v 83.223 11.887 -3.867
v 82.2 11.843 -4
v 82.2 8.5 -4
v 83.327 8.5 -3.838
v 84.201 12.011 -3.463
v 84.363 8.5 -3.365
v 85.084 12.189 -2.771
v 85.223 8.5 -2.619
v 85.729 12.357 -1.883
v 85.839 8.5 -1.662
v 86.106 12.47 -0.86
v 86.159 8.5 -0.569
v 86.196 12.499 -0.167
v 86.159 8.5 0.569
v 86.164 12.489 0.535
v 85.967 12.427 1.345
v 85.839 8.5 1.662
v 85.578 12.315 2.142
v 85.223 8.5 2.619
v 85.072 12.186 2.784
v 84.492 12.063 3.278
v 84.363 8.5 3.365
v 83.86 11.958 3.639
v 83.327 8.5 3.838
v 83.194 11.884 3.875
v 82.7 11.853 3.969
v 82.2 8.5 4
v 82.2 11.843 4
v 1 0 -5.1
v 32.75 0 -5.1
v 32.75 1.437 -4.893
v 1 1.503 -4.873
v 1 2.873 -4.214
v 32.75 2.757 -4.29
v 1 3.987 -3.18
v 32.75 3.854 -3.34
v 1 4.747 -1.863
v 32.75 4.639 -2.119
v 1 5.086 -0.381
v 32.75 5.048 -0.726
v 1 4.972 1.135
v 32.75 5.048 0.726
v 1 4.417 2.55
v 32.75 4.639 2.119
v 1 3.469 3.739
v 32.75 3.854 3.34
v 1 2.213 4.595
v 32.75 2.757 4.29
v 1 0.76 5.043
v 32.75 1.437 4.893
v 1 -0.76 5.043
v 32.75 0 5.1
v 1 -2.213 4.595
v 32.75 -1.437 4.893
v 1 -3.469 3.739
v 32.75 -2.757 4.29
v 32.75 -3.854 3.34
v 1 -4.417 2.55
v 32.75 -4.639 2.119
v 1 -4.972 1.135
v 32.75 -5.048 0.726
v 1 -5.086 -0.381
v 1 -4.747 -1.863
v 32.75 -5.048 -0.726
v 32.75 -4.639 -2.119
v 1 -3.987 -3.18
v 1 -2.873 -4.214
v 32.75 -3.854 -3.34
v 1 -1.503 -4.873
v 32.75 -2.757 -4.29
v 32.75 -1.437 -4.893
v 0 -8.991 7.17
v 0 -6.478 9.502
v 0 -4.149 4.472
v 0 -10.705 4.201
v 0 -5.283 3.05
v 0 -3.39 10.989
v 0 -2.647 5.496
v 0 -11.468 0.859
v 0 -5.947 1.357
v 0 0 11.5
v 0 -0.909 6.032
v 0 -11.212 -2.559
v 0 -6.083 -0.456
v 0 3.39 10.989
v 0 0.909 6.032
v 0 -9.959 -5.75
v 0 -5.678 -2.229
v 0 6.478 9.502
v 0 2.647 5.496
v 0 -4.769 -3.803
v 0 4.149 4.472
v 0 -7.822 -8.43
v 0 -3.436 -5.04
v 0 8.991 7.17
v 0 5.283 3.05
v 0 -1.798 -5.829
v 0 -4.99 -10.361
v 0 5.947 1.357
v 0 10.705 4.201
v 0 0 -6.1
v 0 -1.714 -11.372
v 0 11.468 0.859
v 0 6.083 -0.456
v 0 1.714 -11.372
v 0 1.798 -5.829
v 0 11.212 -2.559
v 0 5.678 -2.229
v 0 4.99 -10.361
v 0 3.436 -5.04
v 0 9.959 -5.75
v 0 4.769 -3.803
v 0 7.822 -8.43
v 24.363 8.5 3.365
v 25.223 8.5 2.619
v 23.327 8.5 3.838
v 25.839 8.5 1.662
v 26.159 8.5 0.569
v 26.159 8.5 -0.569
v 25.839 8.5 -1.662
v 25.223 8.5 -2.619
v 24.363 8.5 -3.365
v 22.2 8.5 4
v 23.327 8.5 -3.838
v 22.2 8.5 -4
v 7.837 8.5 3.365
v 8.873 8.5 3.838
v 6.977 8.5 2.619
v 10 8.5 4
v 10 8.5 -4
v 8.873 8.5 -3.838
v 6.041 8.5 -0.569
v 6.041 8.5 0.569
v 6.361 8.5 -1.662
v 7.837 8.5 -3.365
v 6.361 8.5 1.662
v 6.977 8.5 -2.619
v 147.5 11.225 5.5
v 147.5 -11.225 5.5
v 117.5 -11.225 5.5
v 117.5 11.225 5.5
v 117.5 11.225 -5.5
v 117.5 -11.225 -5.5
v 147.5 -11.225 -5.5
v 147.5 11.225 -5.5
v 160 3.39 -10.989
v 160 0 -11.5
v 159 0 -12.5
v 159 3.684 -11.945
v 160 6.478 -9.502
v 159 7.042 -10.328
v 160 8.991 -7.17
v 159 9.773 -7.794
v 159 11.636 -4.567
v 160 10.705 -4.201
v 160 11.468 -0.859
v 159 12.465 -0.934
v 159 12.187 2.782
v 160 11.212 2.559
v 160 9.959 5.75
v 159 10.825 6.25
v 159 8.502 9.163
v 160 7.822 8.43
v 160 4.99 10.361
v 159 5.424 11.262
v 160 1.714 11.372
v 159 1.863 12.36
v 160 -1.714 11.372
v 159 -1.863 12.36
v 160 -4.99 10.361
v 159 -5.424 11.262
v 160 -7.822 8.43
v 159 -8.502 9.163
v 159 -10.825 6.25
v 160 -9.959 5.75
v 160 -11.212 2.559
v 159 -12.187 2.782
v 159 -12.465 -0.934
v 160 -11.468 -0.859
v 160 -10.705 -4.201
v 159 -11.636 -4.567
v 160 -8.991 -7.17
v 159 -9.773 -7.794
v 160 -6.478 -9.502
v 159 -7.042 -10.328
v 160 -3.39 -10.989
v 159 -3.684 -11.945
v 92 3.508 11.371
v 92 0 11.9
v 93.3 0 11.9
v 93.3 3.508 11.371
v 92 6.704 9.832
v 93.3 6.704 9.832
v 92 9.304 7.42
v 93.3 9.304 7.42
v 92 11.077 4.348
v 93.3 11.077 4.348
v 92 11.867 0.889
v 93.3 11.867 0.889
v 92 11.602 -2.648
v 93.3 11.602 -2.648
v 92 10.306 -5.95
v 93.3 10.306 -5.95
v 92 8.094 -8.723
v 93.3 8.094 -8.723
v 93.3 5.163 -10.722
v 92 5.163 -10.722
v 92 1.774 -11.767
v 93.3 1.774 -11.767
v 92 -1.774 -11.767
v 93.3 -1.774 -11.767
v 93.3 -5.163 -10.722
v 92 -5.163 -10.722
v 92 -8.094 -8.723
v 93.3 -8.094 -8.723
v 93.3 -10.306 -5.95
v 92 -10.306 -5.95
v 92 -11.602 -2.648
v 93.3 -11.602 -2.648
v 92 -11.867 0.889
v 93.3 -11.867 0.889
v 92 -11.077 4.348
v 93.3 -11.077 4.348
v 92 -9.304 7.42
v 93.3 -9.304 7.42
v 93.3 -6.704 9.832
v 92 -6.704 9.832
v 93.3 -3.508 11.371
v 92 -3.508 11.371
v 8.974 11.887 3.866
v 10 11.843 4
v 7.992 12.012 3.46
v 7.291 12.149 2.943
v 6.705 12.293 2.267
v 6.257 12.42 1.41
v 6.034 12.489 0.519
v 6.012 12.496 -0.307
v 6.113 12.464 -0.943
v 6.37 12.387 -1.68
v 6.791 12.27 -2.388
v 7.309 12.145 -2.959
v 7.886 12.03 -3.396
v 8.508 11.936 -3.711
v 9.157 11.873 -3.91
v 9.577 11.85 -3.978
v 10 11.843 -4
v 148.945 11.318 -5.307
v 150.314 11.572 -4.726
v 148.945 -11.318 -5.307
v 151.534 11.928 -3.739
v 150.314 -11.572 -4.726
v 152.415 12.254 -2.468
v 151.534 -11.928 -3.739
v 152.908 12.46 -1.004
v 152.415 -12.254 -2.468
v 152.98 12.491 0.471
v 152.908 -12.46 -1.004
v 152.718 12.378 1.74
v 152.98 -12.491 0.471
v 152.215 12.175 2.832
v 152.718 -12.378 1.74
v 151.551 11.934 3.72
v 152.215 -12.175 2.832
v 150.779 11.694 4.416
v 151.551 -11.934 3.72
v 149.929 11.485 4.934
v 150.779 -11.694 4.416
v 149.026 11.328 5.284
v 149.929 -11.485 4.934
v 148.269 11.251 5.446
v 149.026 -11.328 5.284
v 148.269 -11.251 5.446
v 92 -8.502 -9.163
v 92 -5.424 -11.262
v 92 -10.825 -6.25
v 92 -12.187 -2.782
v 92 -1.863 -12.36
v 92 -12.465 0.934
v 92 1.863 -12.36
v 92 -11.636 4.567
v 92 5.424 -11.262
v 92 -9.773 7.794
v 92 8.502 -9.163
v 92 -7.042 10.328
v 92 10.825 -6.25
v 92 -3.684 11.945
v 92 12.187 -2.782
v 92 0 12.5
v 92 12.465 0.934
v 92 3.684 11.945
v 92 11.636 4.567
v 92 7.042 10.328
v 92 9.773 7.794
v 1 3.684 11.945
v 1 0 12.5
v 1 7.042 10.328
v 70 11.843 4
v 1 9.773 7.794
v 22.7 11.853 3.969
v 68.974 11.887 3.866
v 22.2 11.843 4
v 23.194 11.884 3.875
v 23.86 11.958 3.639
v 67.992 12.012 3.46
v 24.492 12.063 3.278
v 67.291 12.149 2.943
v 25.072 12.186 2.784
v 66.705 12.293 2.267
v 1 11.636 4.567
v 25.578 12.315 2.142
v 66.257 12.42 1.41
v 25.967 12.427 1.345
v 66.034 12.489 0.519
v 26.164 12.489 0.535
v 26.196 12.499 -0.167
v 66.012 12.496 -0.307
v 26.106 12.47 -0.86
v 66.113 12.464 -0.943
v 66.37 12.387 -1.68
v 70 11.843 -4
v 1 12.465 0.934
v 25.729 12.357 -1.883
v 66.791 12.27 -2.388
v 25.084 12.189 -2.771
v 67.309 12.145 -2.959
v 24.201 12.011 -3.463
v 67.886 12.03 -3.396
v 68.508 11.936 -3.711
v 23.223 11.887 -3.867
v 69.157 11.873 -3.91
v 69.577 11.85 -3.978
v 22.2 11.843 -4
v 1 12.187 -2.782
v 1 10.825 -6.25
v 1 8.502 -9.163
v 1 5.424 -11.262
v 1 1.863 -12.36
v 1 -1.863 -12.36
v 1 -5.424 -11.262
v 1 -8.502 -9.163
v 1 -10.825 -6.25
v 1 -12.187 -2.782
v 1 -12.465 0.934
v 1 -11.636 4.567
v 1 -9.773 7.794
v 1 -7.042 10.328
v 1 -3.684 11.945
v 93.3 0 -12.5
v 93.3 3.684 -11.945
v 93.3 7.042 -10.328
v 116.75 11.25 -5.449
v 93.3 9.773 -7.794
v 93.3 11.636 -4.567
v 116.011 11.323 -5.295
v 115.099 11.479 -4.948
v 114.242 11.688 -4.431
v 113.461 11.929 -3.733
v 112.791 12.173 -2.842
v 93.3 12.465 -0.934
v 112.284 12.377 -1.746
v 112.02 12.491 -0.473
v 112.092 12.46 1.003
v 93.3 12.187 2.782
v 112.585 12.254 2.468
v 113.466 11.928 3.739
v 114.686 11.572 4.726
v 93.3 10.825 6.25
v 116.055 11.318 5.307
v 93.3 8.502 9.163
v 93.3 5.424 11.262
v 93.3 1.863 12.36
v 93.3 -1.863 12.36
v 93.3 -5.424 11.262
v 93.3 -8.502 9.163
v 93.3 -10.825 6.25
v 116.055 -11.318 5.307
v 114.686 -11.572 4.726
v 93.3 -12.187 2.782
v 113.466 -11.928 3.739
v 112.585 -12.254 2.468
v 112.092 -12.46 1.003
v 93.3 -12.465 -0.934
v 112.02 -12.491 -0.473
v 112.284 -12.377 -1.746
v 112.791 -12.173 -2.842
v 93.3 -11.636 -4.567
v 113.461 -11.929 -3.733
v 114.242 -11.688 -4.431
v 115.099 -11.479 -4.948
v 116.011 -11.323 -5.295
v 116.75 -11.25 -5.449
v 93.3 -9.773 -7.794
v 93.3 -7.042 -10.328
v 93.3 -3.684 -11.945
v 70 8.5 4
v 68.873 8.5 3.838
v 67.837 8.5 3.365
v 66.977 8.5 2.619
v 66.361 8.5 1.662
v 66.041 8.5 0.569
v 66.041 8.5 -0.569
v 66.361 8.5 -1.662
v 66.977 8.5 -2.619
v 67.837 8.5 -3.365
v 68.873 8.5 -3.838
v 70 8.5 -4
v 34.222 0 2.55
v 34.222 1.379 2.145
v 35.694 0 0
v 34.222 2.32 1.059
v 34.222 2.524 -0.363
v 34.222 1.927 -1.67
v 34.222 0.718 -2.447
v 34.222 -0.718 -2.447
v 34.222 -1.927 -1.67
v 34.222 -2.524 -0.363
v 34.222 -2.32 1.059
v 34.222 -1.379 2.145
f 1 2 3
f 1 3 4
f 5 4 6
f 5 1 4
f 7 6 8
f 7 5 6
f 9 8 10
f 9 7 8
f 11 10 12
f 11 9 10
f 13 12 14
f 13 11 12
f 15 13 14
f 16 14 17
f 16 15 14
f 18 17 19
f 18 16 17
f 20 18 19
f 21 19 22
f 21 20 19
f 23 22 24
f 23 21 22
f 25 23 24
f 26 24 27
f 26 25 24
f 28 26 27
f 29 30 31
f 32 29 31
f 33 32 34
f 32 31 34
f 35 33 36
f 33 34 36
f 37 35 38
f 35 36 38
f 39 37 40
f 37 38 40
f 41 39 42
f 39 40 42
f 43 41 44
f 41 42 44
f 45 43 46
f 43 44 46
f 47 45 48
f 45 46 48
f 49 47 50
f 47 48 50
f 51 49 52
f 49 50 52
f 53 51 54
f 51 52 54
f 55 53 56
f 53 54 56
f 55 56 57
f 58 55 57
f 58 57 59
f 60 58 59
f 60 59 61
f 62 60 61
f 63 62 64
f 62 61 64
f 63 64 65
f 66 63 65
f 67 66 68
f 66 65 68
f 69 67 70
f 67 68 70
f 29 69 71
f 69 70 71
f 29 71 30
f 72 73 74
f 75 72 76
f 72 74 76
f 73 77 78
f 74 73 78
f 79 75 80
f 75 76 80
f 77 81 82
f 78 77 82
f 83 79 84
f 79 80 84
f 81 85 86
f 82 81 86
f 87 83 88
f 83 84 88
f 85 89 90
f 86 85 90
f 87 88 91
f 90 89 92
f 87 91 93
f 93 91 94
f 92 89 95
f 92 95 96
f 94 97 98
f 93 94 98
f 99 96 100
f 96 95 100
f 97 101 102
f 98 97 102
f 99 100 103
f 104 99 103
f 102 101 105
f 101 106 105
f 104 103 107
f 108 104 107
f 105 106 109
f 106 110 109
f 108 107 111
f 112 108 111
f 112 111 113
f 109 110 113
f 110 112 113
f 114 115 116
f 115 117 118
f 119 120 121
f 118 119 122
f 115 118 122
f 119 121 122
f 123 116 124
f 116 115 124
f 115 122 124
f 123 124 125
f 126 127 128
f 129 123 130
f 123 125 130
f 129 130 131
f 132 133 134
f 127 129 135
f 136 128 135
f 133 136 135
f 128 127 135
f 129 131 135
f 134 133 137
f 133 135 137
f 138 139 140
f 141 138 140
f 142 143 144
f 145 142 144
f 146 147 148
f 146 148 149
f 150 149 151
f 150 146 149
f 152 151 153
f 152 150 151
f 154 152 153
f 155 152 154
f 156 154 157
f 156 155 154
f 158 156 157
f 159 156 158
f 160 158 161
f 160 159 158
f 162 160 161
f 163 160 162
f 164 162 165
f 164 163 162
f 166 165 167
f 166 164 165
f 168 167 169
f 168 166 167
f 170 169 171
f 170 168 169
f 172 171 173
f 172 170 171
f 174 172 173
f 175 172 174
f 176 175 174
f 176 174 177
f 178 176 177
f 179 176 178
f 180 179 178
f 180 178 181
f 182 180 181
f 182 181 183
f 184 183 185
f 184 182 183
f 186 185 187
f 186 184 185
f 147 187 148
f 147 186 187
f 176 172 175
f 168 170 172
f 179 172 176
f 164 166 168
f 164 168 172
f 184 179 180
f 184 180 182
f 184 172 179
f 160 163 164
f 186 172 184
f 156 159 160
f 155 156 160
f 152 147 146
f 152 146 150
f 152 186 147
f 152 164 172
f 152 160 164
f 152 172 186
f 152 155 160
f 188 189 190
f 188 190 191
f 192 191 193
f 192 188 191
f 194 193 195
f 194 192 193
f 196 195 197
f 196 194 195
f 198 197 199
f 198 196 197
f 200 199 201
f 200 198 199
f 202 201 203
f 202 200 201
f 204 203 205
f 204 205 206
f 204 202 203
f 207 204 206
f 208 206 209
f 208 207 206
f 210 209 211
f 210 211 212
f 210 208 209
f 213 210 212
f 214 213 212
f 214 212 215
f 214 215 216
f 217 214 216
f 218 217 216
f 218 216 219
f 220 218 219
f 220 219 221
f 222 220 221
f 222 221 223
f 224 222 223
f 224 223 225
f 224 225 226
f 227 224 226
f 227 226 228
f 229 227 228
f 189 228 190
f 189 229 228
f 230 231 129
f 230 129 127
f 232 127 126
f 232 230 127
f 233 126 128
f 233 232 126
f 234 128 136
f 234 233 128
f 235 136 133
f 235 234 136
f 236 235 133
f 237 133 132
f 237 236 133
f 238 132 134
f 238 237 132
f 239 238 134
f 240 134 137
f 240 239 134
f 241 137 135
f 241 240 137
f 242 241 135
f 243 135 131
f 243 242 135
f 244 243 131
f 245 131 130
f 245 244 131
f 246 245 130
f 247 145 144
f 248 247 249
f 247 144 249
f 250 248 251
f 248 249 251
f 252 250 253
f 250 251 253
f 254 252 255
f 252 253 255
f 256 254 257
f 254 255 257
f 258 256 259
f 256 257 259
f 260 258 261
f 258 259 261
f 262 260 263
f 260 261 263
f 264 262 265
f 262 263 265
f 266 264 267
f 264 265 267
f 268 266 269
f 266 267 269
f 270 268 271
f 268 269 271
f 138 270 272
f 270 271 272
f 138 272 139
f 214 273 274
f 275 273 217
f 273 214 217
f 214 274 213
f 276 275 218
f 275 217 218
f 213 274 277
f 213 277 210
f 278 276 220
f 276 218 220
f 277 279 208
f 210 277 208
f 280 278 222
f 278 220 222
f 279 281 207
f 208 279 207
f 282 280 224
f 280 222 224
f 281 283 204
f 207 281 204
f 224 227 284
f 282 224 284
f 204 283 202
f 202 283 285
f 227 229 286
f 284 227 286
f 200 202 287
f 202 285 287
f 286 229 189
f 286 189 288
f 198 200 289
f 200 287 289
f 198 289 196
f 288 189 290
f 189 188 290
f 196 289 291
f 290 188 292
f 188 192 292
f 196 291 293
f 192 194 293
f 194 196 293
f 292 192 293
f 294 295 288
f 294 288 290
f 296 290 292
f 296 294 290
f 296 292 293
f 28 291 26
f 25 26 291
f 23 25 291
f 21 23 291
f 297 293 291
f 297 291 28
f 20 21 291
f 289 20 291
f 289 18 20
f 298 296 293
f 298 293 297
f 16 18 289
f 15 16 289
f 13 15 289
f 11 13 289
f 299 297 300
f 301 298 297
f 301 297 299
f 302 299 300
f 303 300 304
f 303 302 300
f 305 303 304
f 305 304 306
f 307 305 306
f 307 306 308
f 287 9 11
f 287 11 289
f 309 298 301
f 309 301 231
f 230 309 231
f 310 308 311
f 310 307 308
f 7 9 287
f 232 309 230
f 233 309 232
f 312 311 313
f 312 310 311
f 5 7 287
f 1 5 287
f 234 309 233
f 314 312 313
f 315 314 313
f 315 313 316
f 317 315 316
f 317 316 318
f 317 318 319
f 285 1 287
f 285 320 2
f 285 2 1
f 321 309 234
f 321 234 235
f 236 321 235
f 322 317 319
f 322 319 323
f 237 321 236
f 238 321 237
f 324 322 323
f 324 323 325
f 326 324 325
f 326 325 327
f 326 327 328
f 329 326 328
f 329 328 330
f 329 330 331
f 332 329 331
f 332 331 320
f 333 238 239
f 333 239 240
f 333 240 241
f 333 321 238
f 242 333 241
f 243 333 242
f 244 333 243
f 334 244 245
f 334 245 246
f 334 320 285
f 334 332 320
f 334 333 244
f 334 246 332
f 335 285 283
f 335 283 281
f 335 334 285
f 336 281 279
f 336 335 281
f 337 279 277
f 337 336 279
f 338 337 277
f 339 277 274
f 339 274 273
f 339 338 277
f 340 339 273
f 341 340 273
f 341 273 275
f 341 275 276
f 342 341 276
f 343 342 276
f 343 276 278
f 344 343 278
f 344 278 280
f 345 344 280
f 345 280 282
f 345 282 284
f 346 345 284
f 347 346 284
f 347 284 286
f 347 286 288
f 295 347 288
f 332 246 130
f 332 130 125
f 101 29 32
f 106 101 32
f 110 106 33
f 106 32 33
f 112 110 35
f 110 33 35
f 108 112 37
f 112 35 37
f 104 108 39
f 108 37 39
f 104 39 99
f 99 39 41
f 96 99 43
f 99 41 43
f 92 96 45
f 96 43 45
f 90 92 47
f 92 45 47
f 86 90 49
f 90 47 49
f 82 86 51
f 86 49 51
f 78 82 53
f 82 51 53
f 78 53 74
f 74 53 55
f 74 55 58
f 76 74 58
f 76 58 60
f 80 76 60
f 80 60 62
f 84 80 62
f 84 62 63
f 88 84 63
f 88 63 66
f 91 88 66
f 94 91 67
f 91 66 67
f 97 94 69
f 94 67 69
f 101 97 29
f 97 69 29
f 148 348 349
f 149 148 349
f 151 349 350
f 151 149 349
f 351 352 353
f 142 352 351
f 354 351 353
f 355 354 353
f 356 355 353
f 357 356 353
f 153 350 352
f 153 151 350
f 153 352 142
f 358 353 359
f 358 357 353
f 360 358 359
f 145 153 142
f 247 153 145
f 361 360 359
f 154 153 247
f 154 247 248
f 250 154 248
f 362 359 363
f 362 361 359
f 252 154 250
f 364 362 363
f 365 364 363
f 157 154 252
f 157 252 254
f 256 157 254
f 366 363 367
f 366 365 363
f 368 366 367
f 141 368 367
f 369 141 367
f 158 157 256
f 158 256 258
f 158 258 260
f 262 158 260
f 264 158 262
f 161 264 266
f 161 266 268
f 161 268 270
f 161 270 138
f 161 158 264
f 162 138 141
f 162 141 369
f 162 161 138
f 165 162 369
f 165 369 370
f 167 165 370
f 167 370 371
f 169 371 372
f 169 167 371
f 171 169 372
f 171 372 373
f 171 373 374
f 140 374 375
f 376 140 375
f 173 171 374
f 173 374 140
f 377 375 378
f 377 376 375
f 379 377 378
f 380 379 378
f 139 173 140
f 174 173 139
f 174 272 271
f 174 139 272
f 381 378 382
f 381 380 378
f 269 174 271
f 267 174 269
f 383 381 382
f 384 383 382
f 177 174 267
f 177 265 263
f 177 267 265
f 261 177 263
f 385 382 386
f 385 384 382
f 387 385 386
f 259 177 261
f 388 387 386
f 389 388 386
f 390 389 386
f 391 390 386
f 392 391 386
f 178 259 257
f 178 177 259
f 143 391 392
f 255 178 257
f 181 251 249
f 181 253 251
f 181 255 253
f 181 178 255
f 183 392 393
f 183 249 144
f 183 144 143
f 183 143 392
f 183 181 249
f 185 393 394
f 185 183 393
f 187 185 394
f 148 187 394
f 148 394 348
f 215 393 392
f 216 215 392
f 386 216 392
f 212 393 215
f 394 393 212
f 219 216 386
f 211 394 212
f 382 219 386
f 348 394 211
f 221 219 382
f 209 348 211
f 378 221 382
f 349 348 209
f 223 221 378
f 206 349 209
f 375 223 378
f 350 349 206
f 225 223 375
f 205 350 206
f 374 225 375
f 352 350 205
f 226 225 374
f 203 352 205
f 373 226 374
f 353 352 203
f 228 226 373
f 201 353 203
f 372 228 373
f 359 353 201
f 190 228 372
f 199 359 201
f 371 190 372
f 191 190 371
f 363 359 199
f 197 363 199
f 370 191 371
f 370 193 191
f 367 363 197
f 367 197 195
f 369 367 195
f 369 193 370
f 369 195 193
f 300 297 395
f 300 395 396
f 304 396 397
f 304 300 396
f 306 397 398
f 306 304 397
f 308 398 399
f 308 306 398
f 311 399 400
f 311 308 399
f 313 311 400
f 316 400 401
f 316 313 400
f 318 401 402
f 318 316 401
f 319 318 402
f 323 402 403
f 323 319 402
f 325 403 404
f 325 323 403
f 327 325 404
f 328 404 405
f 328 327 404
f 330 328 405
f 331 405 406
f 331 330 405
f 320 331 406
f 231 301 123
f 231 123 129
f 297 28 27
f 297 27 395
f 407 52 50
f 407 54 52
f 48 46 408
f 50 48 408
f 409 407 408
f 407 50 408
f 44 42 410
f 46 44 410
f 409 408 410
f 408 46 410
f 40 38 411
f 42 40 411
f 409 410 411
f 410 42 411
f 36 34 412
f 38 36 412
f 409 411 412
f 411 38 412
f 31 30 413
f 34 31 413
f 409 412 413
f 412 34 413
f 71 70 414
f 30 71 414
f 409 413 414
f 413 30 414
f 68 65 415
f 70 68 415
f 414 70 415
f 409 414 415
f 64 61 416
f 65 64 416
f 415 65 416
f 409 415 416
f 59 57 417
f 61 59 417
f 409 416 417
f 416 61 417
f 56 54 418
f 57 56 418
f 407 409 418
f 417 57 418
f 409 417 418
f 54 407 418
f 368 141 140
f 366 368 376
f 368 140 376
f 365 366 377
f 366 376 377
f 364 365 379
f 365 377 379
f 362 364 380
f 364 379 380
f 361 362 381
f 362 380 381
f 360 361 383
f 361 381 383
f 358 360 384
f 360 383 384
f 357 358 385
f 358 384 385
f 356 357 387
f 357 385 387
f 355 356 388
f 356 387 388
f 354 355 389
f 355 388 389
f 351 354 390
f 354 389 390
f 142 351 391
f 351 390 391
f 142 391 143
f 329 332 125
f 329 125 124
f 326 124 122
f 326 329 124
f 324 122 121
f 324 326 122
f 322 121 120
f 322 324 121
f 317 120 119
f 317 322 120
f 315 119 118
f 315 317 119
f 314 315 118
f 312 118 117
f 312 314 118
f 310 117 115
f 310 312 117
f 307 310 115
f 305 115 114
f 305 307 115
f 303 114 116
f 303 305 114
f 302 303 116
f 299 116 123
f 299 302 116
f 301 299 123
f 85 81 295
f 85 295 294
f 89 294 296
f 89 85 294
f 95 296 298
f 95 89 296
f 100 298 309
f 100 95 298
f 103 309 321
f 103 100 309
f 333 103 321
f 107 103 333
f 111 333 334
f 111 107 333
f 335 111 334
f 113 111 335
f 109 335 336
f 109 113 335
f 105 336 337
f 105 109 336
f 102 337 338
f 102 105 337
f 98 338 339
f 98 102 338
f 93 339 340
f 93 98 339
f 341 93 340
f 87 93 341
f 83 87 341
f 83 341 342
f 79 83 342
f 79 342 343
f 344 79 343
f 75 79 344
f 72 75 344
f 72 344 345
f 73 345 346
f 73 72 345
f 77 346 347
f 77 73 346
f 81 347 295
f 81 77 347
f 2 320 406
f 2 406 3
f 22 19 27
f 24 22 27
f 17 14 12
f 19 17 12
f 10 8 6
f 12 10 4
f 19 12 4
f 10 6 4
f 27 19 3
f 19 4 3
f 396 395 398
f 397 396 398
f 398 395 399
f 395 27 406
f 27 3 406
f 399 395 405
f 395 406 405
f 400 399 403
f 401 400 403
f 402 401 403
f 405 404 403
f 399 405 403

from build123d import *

# Parameters (mm, degrees)
SKETCH_1_R               = 15
EXTRUDE_1_DEPTH          = 160
SKETCH_2_OUTSIDE_W       = 65.106
SKETCH_2_OUTSIDE_H       = 65.106
SKETCH_2_OUTSIDE_R       = 12.5
CUT_EXTRUDE_1_DEPTH      = 92
SKETCH_3_OUTSIDE_W       = 65.106
SKETCH_3_OUTSIDE_H       = 65.106
SKETCH_3_OUTSIDE_R       = 12.5
CUT_EXTRUDE_2_DEPTH      = 63
CHAMFER_1_SIZE           = 1
CUT_EXTRUDE_START        = 12.5
CUT_EXTRUDE_3_DEPTH      = 4
HOLE_WIZARD_M121_D       = 10.2
HOLE_WIZARD_M121_DEPTH   = 32.75
HOLE_WIZARD_M121_TIP     = 2.944486373
CHAMFER_2_SIZE           = 1
CUT_EXTRUDE_4_DEPTH      = 16
CUT_EXTRUDE_4_DEPTH_BACK = 16
SKETCH_9_R               = 15
SKETCH_9_R_2             = 11.9
CUT_EXTRUDE_5_DEPTH      = 1.3
SKETCH_10_R              = 15
SKETCH_10_R_2            = 12.5
CUT_EXTRUDE_6_DEPTH      = 7.3


with BuildPart() as part:
    # Эскиз1 → Бобышка-Вытянуть1 (new body)
    with BuildSketch(Plane(origin=(0, 0, 0), x_dir=(0, 0, -1), z_dir=(1, 0, 0))):
        Circle(SKETCH_1_R)
    extrude(amount=EXTRUDE_1_DEPTH)

    # Эскиз2 outside → Вырез-Вытянуть1 (cut)
    with BuildSketch(Plane.ZY):
        Rectangle(SKETCH_2_OUTSIDE_W, SKETCH_2_OUTSIDE_H)
        Circle(SKETCH_2_OUTSIDE_R, mode=Mode.SUBTRACT)
    extrude(amount=-CUT_EXTRUDE_1_DEPTH, mode=Mode.SUBTRACT)

    # Эскиз3 outside → Вырез-Вытянуть2 (cut)
    with BuildSketch(Plane(origin=(160, 0, 0), x_dir=(0, 0, -1), z_dir=(1, 0, 0))):
        Rectangle(SKETCH_3_OUTSIDE_W, SKETCH_3_OUTSIDE_H)
        Circle(SKETCH_3_OUTSIDE_R, mode=Mode.SUBTRACT)
    extrude(amount=-CUT_EXTRUDE_2_DEPTH, mode=Mode.SUBTRACT)

    # Фаска1
    chamfer_1_edges = [part.edges().sort_by_distance(p)[0] for p in [
        (0, 0, -12.5),
        (97, 0, 15),
        (160, 0, 12.5),
        (92, 0, 15),
    ]]
    chamfer(chamfer_1_edges, length=CHAMFER_1_SIZE)

    # Эскиз4 → Вырез-Вытянуть3 (cut)
    with BuildSketch(Plane(origin=(0, 0, 0), x_dir=(1, 0, 0), z_dir=(0, 1, 0)).offset(CUT_EXTRUDE_START)):
        with BuildLine():
            Line((10, 4), (22.2, 4))
            ThreePointArc((22.2, 4), (26.2, 0), (22.2, -4))
            Line((22.2, -4), (10, -4))
            ThreePointArc((10, -4), (6, 0), (10, 4))
        make_face()
        with BuildLine():
            Line((70, 4), (82.2, 4))
            ThreePointArc((82.2, 4), (86.2, 0), (82.2, -4))
            Line((82.2, -4), (70, -4))
            ThreePointArc((70, -4), (66, 0), (70, 4))
        make_face()
    extrude(amount=-CUT_EXTRUDE_3_DEPTH, mode=Mode.SUBTRACT)

    # Отверстие обработанное метчиком M121
    with Locations(Plane.ZY):
        with Locations((0, 0)):
            Hole(HOLE_WIZARD_M121_D / 2, depth=HOLE_WIZARD_M121_DEPTH)
            with Locations((0, 0, -(HOLE_WIZARD_M121_DEPTH + HOLE_WIZARD_M121_TIP / 2))):  # 120° drill point
                Cone(0, HOLE_WIZARD_M121_D / 2, HOLE_WIZARD_M121_TIP, mode=Mode.SUBTRACT)

    # Фаска2
    chamfer_2_edges = [part.edges().sort_by_distance(p)[0] for p in [
        (0, 0, 5.1),
    ]]
    chamfer(chamfer_2_edges, length=CHAMFER_2_SIZE)

    # Эскиз8 → Вырез-Вытянуть4 (cut, two sides)
    with BuildSketch(Plane(origin=(0, 0, 0), x_dir=(1, 0, 0), z_dir=(0, 1, 0))) as cut_extrude_4_sk:
        with BuildLine():
            Line((147.5, -5.5), (117.5, -5.5))
            ThreePointArc((117.5, -5.5), (112, 0), (117.5, 5.5))
            Line((117.5, 5.5), (147.5, 5.5))
            ThreePointArc((147.5, 5.5), (153, 0), (147.5, -5.5))
        make_face()
    extrude(amount=CUT_EXTRUDE_4_DEPTH, mode=Mode.SUBTRACT)
    extrude(cut_extrude_4_sk.sketch, amount=-CUT_EXTRUDE_4_DEPTH_BACK, mode=Mode.SUBTRACT)

    # Эскиз9 → Вырез-Вытянуть5 (cut)
    with BuildSketch(Plane.ZY.offset(-92)):
        Circle(SKETCH_9_R)
        Circle(SKETCH_9_R_2, mode=Mode.SUBTRACT)
    extrude(amount=-CUT_EXTRUDE_5_DEPTH, mode=Mode.SUBTRACT)

    # Эскиз10 → Вырез-Вытянуть6 (cut)
    with BuildSketch(Plane(origin=(97, 0, 0), x_dir=(0, 0, -1), z_dir=(1, 0, 0))):
        Circle(SKETCH_10_R)
        Circle(SKETCH_10_R_2, mode=Mode.SUBTRACT)
    extrude(amount=-CUT_EXTRUDE_6_DEPTH, mode=Mode.SUBTRACT)


solid = part.part
